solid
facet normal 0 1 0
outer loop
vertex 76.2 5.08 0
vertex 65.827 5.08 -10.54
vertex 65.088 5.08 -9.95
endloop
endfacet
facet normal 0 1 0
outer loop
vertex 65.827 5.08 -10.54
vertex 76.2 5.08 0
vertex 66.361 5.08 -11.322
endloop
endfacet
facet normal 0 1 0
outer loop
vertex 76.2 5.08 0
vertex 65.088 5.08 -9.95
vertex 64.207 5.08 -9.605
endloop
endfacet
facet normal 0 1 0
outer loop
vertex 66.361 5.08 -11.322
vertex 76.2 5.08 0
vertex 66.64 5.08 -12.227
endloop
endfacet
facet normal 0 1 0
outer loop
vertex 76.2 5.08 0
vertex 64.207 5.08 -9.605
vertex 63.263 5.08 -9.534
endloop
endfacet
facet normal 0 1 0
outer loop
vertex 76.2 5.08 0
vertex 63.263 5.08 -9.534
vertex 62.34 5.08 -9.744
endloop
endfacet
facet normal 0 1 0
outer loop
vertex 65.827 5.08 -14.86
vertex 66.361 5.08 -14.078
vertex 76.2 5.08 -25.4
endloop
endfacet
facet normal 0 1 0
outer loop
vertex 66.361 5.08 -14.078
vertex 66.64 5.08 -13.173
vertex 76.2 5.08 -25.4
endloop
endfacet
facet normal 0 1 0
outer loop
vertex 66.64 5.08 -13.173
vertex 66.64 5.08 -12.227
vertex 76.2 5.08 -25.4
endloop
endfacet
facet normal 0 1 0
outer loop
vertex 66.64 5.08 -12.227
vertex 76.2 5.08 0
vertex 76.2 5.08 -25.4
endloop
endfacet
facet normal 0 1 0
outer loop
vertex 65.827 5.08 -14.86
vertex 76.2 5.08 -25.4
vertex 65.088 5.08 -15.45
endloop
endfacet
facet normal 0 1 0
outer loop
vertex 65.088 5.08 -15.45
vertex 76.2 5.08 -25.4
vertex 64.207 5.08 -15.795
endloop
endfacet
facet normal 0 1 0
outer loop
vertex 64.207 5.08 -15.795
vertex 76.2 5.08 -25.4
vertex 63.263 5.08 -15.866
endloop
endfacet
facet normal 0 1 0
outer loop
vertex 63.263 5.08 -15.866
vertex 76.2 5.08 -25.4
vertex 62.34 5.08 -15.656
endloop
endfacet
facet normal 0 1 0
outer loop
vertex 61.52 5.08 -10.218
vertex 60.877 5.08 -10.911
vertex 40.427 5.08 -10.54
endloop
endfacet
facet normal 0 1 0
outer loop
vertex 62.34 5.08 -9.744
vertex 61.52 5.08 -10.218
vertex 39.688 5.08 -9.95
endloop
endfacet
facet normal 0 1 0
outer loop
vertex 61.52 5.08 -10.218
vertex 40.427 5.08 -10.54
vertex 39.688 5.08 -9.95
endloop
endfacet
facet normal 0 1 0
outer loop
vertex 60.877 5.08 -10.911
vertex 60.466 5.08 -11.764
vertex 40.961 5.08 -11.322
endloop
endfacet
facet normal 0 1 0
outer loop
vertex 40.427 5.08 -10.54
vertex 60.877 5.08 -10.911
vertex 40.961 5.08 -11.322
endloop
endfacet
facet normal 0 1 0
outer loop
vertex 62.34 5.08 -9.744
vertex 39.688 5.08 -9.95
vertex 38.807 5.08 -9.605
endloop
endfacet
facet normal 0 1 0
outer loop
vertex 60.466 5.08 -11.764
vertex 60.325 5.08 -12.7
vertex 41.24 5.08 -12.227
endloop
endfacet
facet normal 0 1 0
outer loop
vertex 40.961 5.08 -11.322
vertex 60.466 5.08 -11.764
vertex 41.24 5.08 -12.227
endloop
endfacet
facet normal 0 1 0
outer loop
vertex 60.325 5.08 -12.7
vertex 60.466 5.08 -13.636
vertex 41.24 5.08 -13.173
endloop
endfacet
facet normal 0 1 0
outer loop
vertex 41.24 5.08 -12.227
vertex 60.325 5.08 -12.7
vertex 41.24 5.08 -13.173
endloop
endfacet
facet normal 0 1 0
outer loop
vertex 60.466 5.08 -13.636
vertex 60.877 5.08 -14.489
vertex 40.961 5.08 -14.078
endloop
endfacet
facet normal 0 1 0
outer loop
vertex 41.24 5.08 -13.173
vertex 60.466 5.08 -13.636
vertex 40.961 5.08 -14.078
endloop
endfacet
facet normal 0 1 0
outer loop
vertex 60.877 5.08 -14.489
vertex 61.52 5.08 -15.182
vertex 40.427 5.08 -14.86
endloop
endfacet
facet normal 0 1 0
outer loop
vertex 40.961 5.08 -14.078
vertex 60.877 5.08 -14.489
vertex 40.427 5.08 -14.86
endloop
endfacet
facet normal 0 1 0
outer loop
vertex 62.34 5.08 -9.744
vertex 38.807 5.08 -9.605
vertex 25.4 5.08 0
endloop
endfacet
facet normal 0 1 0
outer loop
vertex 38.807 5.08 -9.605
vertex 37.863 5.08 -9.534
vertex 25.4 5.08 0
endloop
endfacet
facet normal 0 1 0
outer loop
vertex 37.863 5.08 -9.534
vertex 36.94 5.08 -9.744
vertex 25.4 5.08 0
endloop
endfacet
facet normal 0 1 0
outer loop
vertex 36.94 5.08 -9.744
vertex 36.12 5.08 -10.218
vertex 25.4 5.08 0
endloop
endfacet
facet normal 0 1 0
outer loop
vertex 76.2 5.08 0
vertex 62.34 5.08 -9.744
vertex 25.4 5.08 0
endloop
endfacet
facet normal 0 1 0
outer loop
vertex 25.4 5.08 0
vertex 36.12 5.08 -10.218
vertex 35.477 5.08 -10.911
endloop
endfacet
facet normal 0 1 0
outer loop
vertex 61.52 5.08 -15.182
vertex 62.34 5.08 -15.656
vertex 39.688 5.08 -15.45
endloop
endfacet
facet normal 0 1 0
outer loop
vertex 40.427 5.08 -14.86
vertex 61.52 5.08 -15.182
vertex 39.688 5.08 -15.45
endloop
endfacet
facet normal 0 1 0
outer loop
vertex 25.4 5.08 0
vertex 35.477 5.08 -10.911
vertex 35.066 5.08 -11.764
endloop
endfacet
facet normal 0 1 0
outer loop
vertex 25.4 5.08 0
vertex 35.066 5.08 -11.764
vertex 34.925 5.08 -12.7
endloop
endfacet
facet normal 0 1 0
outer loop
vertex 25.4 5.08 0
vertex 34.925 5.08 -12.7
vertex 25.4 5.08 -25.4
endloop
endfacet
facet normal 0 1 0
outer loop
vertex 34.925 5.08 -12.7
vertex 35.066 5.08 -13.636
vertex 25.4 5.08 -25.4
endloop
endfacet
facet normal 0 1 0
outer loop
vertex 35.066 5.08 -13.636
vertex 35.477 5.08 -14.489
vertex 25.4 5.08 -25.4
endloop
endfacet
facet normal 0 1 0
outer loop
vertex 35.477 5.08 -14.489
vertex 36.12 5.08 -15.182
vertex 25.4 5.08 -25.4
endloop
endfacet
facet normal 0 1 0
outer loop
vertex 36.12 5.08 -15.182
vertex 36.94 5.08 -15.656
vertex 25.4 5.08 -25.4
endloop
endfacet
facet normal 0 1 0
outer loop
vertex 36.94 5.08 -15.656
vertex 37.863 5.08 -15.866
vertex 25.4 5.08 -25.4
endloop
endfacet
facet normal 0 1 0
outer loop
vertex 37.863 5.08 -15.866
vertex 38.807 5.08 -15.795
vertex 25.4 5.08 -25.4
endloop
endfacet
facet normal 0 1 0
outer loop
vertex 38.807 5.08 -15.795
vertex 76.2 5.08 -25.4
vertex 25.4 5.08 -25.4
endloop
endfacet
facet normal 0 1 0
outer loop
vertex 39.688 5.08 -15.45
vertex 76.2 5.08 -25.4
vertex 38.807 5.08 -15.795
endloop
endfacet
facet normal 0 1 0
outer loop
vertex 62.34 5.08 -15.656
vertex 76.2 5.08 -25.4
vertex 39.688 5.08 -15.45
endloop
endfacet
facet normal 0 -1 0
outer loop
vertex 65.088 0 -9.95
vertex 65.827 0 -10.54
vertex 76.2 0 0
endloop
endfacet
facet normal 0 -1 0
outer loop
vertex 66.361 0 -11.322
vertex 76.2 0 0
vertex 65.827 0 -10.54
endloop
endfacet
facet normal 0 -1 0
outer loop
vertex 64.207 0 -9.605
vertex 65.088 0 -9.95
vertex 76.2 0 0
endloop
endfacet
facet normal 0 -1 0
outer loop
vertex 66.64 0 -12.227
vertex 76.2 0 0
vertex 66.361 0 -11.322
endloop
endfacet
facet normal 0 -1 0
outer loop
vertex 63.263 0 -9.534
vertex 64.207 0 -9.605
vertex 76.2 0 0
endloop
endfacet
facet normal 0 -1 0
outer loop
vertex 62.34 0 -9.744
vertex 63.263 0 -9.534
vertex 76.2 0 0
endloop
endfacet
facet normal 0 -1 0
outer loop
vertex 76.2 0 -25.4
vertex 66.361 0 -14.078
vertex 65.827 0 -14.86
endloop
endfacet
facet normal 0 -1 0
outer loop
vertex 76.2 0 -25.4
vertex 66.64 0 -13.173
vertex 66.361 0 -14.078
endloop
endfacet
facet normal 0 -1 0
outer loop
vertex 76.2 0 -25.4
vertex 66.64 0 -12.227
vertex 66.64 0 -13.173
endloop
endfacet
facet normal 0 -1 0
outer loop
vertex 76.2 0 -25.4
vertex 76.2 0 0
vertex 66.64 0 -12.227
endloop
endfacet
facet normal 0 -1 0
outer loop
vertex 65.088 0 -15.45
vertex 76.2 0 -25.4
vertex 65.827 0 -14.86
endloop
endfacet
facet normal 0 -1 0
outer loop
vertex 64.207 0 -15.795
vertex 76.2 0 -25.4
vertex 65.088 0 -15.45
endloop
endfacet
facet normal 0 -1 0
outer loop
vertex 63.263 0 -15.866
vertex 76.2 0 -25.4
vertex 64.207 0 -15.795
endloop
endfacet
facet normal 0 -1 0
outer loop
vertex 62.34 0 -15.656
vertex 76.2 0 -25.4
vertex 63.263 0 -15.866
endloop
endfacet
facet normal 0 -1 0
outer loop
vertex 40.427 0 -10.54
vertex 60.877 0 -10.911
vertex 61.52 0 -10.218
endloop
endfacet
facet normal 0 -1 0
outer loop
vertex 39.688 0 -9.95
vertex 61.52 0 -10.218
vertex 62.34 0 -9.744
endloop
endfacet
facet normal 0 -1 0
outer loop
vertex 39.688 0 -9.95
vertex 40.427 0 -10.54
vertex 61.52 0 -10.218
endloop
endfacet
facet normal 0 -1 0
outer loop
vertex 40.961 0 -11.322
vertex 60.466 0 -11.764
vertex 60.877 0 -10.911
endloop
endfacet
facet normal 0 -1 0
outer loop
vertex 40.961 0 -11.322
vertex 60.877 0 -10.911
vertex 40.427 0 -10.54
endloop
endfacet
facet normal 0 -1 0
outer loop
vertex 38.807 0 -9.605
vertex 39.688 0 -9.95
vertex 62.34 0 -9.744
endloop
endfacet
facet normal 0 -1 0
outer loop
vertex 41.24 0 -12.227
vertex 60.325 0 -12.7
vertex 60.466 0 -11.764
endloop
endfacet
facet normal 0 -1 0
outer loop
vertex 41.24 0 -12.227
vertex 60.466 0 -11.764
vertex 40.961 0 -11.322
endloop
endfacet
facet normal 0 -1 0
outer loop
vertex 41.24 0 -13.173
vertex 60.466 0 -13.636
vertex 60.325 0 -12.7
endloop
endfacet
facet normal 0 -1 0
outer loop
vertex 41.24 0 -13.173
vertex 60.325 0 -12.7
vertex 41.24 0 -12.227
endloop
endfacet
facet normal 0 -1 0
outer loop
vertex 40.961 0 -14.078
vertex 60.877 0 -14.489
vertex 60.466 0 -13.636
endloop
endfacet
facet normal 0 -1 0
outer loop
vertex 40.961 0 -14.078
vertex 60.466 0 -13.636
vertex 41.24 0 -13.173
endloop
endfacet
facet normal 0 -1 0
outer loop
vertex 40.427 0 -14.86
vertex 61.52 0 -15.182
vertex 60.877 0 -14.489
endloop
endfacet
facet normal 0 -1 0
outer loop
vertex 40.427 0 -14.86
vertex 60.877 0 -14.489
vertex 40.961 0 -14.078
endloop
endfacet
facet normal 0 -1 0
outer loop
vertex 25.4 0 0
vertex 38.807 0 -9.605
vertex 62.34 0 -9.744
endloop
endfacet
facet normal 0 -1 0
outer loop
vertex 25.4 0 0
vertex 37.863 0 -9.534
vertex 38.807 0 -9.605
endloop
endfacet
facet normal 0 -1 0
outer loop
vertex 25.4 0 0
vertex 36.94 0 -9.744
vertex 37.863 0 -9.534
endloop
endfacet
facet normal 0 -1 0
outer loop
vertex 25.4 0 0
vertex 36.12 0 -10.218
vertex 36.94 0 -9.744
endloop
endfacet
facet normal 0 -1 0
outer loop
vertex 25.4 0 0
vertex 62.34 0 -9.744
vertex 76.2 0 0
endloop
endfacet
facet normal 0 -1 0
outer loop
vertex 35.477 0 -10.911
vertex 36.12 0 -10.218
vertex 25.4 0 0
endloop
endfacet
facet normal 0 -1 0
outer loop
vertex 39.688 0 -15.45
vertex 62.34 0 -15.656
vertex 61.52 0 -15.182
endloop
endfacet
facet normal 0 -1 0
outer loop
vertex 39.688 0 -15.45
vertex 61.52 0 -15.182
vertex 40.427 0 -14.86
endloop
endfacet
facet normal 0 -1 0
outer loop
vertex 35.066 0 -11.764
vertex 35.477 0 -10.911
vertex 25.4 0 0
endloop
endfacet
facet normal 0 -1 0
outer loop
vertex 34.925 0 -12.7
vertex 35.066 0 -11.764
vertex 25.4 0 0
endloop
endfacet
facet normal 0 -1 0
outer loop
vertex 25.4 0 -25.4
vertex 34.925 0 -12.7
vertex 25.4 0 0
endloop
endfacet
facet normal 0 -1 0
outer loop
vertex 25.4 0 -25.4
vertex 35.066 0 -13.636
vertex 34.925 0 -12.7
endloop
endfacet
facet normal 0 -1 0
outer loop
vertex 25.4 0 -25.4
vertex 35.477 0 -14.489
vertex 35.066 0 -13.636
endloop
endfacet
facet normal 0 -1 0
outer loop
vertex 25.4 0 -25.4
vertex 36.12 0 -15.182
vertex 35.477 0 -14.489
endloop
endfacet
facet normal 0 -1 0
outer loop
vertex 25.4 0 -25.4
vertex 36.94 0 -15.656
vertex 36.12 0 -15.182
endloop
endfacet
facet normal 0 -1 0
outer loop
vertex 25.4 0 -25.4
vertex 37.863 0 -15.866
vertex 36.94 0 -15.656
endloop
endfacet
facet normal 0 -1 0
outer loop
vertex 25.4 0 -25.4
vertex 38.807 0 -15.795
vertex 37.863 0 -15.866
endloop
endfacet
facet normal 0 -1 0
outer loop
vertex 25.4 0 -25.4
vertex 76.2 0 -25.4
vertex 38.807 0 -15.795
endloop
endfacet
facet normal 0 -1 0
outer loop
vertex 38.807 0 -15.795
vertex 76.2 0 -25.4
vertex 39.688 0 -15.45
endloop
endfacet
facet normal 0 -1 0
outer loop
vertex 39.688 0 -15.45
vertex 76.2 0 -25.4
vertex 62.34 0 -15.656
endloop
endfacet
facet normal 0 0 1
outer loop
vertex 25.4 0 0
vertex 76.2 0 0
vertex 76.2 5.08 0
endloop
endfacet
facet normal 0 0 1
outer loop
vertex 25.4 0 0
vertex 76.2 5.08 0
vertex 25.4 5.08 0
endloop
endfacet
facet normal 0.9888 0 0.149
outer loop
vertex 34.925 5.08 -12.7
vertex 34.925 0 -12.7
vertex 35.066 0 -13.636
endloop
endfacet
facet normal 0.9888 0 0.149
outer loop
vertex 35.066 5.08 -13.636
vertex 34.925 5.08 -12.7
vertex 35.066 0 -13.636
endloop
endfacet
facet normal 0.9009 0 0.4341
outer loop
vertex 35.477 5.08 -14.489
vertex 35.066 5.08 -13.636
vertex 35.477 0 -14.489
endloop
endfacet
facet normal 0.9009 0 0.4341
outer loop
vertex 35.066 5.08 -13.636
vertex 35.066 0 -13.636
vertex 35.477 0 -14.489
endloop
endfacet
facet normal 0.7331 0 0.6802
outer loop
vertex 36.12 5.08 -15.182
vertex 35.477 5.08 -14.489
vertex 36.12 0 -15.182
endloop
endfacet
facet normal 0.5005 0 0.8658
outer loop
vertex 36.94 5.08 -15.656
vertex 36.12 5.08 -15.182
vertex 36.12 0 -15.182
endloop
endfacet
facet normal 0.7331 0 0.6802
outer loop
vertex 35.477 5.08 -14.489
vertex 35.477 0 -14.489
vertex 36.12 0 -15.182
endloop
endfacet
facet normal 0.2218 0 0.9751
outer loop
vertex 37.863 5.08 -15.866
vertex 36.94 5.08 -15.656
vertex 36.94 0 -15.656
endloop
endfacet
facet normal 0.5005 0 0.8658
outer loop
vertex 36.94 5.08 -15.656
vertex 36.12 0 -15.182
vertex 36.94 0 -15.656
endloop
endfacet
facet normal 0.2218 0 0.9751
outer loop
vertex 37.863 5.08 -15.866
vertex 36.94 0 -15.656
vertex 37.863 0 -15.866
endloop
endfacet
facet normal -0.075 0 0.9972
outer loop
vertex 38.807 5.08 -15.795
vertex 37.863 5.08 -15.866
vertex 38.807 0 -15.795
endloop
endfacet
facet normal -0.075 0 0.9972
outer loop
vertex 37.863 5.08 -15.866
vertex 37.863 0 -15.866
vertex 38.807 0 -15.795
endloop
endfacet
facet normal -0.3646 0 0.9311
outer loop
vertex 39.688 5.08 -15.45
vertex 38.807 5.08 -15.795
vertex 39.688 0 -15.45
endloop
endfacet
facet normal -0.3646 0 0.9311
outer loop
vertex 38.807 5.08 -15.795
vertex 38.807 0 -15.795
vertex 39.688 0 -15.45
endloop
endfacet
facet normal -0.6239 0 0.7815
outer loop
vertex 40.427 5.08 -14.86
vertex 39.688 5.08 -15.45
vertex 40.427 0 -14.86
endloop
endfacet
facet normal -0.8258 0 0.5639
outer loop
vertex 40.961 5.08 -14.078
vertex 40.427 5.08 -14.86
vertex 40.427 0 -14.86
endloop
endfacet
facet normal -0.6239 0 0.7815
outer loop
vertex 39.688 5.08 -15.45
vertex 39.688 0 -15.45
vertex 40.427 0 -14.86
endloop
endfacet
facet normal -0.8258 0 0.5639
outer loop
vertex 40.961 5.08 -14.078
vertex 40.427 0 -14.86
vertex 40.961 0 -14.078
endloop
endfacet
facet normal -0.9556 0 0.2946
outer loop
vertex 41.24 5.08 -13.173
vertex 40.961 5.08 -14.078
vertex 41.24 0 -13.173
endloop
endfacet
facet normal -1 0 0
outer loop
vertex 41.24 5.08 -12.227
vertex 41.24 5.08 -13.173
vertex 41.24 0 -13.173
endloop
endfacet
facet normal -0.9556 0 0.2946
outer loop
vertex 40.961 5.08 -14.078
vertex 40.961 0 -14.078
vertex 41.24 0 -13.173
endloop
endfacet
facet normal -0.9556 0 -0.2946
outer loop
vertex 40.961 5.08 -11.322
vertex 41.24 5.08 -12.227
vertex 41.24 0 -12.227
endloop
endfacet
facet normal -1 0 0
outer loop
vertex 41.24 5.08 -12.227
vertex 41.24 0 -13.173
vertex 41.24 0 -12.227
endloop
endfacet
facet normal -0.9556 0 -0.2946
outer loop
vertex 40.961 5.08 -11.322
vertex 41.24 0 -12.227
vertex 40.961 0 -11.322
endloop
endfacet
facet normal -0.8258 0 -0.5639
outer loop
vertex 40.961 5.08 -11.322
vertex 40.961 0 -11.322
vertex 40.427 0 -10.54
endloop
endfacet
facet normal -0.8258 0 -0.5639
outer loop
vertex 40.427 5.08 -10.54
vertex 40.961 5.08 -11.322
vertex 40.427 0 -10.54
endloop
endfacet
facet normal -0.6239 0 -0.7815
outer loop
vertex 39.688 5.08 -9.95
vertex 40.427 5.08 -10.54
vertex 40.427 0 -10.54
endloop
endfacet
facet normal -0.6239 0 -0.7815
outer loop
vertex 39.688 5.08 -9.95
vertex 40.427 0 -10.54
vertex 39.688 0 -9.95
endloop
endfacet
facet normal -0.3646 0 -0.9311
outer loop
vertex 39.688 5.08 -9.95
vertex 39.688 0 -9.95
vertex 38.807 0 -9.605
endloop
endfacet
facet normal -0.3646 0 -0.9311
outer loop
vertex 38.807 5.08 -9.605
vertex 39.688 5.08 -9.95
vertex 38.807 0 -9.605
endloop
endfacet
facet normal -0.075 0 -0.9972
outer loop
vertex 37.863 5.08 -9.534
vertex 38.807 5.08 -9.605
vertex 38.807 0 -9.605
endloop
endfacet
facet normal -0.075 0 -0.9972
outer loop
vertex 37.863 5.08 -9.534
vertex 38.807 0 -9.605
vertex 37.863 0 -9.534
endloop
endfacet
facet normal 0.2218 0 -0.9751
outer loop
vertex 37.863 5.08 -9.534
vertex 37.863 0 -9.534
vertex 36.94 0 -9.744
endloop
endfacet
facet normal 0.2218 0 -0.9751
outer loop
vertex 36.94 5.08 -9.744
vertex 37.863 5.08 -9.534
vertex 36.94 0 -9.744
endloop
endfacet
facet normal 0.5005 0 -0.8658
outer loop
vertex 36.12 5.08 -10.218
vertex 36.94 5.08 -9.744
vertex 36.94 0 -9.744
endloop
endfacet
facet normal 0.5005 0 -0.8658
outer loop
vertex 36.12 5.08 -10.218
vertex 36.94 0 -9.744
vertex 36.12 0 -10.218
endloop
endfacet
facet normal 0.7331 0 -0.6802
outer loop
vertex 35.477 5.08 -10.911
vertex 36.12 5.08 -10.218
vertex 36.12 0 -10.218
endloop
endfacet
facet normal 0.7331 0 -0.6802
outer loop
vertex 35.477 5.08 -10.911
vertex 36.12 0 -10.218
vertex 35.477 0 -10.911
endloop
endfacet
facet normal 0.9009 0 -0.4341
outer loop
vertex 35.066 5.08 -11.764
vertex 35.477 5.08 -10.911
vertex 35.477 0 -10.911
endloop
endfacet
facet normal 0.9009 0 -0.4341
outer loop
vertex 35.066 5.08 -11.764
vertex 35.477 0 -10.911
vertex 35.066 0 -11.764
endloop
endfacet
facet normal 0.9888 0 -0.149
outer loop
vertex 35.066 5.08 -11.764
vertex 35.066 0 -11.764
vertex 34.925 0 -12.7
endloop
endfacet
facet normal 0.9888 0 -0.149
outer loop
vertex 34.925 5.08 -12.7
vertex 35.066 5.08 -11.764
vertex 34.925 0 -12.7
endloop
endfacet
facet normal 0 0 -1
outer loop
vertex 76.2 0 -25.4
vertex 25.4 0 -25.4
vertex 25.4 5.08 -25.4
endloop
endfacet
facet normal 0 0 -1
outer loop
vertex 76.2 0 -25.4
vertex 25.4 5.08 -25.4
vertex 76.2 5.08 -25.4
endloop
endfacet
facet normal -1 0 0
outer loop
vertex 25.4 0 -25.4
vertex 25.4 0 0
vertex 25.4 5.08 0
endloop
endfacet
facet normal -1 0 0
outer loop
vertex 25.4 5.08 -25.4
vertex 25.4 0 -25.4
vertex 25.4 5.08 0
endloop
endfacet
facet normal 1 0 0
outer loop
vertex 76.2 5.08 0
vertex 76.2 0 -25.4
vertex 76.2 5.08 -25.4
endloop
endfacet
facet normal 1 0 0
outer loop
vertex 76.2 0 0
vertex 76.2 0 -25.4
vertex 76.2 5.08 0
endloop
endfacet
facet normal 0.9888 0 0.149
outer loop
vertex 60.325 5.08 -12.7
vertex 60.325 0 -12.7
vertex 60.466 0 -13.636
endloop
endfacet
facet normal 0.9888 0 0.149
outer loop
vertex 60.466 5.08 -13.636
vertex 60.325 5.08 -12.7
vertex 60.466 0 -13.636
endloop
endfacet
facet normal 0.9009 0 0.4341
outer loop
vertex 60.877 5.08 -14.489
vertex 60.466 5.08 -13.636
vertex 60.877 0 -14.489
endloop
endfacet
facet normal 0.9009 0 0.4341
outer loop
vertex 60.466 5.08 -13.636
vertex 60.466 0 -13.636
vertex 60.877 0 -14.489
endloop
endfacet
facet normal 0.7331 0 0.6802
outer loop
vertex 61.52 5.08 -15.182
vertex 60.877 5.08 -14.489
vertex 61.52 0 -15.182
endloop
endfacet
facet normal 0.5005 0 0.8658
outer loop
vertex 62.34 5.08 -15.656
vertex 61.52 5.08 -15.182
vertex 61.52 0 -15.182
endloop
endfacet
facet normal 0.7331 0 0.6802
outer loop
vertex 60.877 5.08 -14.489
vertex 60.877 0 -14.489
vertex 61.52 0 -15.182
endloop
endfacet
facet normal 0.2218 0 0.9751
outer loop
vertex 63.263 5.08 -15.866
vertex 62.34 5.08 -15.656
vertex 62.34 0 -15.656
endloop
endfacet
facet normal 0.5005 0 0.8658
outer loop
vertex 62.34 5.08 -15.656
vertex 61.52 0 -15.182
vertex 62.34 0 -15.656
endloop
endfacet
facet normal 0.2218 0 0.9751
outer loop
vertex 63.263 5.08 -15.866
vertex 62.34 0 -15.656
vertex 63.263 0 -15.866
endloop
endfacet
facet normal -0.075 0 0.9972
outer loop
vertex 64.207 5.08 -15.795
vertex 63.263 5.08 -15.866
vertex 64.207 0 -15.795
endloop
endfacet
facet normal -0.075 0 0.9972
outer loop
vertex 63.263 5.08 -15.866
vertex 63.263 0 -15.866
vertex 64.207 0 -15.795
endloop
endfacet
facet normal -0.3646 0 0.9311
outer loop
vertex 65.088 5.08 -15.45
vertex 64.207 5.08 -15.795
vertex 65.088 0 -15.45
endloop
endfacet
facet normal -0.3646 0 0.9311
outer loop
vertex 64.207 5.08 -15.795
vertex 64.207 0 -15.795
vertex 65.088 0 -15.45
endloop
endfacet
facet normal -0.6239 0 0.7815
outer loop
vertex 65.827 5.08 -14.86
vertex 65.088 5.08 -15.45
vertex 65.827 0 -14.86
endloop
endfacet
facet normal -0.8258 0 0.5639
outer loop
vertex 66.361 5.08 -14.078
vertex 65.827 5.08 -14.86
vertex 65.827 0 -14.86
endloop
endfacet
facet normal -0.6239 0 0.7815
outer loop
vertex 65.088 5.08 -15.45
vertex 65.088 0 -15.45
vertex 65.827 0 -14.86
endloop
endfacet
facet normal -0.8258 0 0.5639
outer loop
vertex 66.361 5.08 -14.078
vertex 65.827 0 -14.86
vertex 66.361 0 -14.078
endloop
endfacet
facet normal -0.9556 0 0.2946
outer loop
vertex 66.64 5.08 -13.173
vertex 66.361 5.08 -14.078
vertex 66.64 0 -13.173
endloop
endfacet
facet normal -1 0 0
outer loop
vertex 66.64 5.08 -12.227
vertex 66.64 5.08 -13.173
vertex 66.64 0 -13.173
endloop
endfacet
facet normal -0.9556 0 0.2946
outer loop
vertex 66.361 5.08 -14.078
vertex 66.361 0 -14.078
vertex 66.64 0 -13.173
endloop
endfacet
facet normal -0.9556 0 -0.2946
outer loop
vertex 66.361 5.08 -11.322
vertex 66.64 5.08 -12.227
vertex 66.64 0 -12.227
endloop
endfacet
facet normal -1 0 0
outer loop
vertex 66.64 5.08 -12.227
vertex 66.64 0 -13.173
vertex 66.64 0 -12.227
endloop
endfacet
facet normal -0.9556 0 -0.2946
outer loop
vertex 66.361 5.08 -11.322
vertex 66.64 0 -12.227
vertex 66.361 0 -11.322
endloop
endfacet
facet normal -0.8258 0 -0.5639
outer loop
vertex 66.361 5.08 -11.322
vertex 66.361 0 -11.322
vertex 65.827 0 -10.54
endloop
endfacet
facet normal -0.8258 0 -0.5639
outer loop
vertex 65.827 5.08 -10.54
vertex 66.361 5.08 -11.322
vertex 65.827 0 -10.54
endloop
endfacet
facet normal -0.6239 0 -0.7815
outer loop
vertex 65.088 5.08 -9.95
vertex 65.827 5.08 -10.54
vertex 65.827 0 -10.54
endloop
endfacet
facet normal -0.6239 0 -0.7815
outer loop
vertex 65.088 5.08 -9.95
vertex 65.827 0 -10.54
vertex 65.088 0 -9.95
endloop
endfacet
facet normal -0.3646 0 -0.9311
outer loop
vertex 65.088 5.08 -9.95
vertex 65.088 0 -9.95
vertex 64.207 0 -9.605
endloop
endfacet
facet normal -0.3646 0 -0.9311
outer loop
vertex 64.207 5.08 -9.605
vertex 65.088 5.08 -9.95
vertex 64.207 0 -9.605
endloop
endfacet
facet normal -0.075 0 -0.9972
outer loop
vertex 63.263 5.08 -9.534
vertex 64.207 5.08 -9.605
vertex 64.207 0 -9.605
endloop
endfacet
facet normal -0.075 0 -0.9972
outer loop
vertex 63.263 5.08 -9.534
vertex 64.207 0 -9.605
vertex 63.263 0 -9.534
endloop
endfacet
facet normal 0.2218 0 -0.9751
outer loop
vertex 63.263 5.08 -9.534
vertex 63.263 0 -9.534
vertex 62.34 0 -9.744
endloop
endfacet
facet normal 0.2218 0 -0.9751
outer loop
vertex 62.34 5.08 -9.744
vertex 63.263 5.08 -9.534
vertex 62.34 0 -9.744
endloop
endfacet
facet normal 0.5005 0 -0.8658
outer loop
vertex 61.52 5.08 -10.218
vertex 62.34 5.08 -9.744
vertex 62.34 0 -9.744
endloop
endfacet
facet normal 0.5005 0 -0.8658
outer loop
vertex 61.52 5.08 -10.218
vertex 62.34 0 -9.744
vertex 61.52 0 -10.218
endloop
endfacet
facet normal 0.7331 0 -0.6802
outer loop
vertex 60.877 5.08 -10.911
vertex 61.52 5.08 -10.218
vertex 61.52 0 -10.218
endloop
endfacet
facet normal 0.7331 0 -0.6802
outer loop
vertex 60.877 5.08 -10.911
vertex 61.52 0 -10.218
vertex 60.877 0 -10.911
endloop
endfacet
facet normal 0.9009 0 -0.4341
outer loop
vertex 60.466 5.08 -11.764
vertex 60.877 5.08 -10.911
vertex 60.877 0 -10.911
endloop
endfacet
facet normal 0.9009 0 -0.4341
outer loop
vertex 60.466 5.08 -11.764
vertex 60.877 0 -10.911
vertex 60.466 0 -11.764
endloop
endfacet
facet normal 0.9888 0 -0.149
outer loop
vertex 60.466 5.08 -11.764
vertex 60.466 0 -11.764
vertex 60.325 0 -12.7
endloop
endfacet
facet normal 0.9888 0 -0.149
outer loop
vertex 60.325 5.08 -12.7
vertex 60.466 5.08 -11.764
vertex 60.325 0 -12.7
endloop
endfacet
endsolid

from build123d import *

# Parameters (mm, degrees)
BOSS_EXTRUDE1_DEPTH             = 5.08
F_1_4_0_25_DIAMETER_HOLE1_D     = 6.35
F_1_4_0_25_DIAMETER_HOLE1_DEPTH = 25.4
F_1_4_0_25_DIAMETER_HOLE1_TIP   = 1.907732465
CUT_EXTRUDE1_DEPTH              = 108.882743755
CUT_EXTRUDE1_DEPTH_BACK         = 108.882743755
SKETCH5_W                       = 25.4
SKETCH5_H                       = 5.08


with BuildPart() as part:
    # Sketch1 → Boss-Extrude1 (new body)
    with BuildSketch(Plane(origin=(0, 0, 0), x_dir=(1, 0, 0), z_dir=(0, 1, 0))):
        Polygon((0, 0), (0, 76.2), (25.4, 76.2), (25.4, 25.4), (76.2, 25.4), (76.2, 0), align=None)
    extrude(amount=BOSS_EXTRUDE1_DEPTH)

    # 1/4 (0.25) Diameter Hole1
    with Locations(Plane(origin=(0, 5.08, 0), x_dir=(1, 0, 0), z_dir=(0, 1, 0))):
        with Locations((12.7, 63.5), (12.7, 38.1), (12.7, 12.7), (38.1, 12.7), (63.5, 12.7)):
            Hole(F_1_4_0_25_DIAMETER_HOLE1_D / 2, depth=F_1_4_0_25_DIAMETER_HOLE1_DEPTH)
            with Locations((0, 0, -(F_1_4_0_25_DIAMETER_HOLE1_DEPTH + F_1_4_0_25_DIAMETER_HOLE1_TIP / 2))):  # 118° drill point
                Cone(0, F_1_4_0_25_DIAMETER_HOLE1_D / 2, F_1_4_0_25_DIAMETER_HOLE1_TIP, mode=Mode.SUBTRACT)

    # Sketch5 → Cut-Extrude1 (cut, two sides: drawn at the far end of the back side and taken through both)
    with BuildSketch(Plane(origin=(0, 0, -76.2), x_dir=(-1, 0, 0), z_dir=(0, 0, -1)).offset(-CUT_EXTRUDE1_DEPTH_BACK)):
        with Locations((-12.7, 2.54)):
            Rectangle(SKETCH5_W, SKETCH5_H)
    extrude(amount=CUT_EXTRUDE1_DEPTH + CUT_EXTRUDE1_DEPTH_BACK, mode=Mode.SUBTRACT)


solid = part.part
